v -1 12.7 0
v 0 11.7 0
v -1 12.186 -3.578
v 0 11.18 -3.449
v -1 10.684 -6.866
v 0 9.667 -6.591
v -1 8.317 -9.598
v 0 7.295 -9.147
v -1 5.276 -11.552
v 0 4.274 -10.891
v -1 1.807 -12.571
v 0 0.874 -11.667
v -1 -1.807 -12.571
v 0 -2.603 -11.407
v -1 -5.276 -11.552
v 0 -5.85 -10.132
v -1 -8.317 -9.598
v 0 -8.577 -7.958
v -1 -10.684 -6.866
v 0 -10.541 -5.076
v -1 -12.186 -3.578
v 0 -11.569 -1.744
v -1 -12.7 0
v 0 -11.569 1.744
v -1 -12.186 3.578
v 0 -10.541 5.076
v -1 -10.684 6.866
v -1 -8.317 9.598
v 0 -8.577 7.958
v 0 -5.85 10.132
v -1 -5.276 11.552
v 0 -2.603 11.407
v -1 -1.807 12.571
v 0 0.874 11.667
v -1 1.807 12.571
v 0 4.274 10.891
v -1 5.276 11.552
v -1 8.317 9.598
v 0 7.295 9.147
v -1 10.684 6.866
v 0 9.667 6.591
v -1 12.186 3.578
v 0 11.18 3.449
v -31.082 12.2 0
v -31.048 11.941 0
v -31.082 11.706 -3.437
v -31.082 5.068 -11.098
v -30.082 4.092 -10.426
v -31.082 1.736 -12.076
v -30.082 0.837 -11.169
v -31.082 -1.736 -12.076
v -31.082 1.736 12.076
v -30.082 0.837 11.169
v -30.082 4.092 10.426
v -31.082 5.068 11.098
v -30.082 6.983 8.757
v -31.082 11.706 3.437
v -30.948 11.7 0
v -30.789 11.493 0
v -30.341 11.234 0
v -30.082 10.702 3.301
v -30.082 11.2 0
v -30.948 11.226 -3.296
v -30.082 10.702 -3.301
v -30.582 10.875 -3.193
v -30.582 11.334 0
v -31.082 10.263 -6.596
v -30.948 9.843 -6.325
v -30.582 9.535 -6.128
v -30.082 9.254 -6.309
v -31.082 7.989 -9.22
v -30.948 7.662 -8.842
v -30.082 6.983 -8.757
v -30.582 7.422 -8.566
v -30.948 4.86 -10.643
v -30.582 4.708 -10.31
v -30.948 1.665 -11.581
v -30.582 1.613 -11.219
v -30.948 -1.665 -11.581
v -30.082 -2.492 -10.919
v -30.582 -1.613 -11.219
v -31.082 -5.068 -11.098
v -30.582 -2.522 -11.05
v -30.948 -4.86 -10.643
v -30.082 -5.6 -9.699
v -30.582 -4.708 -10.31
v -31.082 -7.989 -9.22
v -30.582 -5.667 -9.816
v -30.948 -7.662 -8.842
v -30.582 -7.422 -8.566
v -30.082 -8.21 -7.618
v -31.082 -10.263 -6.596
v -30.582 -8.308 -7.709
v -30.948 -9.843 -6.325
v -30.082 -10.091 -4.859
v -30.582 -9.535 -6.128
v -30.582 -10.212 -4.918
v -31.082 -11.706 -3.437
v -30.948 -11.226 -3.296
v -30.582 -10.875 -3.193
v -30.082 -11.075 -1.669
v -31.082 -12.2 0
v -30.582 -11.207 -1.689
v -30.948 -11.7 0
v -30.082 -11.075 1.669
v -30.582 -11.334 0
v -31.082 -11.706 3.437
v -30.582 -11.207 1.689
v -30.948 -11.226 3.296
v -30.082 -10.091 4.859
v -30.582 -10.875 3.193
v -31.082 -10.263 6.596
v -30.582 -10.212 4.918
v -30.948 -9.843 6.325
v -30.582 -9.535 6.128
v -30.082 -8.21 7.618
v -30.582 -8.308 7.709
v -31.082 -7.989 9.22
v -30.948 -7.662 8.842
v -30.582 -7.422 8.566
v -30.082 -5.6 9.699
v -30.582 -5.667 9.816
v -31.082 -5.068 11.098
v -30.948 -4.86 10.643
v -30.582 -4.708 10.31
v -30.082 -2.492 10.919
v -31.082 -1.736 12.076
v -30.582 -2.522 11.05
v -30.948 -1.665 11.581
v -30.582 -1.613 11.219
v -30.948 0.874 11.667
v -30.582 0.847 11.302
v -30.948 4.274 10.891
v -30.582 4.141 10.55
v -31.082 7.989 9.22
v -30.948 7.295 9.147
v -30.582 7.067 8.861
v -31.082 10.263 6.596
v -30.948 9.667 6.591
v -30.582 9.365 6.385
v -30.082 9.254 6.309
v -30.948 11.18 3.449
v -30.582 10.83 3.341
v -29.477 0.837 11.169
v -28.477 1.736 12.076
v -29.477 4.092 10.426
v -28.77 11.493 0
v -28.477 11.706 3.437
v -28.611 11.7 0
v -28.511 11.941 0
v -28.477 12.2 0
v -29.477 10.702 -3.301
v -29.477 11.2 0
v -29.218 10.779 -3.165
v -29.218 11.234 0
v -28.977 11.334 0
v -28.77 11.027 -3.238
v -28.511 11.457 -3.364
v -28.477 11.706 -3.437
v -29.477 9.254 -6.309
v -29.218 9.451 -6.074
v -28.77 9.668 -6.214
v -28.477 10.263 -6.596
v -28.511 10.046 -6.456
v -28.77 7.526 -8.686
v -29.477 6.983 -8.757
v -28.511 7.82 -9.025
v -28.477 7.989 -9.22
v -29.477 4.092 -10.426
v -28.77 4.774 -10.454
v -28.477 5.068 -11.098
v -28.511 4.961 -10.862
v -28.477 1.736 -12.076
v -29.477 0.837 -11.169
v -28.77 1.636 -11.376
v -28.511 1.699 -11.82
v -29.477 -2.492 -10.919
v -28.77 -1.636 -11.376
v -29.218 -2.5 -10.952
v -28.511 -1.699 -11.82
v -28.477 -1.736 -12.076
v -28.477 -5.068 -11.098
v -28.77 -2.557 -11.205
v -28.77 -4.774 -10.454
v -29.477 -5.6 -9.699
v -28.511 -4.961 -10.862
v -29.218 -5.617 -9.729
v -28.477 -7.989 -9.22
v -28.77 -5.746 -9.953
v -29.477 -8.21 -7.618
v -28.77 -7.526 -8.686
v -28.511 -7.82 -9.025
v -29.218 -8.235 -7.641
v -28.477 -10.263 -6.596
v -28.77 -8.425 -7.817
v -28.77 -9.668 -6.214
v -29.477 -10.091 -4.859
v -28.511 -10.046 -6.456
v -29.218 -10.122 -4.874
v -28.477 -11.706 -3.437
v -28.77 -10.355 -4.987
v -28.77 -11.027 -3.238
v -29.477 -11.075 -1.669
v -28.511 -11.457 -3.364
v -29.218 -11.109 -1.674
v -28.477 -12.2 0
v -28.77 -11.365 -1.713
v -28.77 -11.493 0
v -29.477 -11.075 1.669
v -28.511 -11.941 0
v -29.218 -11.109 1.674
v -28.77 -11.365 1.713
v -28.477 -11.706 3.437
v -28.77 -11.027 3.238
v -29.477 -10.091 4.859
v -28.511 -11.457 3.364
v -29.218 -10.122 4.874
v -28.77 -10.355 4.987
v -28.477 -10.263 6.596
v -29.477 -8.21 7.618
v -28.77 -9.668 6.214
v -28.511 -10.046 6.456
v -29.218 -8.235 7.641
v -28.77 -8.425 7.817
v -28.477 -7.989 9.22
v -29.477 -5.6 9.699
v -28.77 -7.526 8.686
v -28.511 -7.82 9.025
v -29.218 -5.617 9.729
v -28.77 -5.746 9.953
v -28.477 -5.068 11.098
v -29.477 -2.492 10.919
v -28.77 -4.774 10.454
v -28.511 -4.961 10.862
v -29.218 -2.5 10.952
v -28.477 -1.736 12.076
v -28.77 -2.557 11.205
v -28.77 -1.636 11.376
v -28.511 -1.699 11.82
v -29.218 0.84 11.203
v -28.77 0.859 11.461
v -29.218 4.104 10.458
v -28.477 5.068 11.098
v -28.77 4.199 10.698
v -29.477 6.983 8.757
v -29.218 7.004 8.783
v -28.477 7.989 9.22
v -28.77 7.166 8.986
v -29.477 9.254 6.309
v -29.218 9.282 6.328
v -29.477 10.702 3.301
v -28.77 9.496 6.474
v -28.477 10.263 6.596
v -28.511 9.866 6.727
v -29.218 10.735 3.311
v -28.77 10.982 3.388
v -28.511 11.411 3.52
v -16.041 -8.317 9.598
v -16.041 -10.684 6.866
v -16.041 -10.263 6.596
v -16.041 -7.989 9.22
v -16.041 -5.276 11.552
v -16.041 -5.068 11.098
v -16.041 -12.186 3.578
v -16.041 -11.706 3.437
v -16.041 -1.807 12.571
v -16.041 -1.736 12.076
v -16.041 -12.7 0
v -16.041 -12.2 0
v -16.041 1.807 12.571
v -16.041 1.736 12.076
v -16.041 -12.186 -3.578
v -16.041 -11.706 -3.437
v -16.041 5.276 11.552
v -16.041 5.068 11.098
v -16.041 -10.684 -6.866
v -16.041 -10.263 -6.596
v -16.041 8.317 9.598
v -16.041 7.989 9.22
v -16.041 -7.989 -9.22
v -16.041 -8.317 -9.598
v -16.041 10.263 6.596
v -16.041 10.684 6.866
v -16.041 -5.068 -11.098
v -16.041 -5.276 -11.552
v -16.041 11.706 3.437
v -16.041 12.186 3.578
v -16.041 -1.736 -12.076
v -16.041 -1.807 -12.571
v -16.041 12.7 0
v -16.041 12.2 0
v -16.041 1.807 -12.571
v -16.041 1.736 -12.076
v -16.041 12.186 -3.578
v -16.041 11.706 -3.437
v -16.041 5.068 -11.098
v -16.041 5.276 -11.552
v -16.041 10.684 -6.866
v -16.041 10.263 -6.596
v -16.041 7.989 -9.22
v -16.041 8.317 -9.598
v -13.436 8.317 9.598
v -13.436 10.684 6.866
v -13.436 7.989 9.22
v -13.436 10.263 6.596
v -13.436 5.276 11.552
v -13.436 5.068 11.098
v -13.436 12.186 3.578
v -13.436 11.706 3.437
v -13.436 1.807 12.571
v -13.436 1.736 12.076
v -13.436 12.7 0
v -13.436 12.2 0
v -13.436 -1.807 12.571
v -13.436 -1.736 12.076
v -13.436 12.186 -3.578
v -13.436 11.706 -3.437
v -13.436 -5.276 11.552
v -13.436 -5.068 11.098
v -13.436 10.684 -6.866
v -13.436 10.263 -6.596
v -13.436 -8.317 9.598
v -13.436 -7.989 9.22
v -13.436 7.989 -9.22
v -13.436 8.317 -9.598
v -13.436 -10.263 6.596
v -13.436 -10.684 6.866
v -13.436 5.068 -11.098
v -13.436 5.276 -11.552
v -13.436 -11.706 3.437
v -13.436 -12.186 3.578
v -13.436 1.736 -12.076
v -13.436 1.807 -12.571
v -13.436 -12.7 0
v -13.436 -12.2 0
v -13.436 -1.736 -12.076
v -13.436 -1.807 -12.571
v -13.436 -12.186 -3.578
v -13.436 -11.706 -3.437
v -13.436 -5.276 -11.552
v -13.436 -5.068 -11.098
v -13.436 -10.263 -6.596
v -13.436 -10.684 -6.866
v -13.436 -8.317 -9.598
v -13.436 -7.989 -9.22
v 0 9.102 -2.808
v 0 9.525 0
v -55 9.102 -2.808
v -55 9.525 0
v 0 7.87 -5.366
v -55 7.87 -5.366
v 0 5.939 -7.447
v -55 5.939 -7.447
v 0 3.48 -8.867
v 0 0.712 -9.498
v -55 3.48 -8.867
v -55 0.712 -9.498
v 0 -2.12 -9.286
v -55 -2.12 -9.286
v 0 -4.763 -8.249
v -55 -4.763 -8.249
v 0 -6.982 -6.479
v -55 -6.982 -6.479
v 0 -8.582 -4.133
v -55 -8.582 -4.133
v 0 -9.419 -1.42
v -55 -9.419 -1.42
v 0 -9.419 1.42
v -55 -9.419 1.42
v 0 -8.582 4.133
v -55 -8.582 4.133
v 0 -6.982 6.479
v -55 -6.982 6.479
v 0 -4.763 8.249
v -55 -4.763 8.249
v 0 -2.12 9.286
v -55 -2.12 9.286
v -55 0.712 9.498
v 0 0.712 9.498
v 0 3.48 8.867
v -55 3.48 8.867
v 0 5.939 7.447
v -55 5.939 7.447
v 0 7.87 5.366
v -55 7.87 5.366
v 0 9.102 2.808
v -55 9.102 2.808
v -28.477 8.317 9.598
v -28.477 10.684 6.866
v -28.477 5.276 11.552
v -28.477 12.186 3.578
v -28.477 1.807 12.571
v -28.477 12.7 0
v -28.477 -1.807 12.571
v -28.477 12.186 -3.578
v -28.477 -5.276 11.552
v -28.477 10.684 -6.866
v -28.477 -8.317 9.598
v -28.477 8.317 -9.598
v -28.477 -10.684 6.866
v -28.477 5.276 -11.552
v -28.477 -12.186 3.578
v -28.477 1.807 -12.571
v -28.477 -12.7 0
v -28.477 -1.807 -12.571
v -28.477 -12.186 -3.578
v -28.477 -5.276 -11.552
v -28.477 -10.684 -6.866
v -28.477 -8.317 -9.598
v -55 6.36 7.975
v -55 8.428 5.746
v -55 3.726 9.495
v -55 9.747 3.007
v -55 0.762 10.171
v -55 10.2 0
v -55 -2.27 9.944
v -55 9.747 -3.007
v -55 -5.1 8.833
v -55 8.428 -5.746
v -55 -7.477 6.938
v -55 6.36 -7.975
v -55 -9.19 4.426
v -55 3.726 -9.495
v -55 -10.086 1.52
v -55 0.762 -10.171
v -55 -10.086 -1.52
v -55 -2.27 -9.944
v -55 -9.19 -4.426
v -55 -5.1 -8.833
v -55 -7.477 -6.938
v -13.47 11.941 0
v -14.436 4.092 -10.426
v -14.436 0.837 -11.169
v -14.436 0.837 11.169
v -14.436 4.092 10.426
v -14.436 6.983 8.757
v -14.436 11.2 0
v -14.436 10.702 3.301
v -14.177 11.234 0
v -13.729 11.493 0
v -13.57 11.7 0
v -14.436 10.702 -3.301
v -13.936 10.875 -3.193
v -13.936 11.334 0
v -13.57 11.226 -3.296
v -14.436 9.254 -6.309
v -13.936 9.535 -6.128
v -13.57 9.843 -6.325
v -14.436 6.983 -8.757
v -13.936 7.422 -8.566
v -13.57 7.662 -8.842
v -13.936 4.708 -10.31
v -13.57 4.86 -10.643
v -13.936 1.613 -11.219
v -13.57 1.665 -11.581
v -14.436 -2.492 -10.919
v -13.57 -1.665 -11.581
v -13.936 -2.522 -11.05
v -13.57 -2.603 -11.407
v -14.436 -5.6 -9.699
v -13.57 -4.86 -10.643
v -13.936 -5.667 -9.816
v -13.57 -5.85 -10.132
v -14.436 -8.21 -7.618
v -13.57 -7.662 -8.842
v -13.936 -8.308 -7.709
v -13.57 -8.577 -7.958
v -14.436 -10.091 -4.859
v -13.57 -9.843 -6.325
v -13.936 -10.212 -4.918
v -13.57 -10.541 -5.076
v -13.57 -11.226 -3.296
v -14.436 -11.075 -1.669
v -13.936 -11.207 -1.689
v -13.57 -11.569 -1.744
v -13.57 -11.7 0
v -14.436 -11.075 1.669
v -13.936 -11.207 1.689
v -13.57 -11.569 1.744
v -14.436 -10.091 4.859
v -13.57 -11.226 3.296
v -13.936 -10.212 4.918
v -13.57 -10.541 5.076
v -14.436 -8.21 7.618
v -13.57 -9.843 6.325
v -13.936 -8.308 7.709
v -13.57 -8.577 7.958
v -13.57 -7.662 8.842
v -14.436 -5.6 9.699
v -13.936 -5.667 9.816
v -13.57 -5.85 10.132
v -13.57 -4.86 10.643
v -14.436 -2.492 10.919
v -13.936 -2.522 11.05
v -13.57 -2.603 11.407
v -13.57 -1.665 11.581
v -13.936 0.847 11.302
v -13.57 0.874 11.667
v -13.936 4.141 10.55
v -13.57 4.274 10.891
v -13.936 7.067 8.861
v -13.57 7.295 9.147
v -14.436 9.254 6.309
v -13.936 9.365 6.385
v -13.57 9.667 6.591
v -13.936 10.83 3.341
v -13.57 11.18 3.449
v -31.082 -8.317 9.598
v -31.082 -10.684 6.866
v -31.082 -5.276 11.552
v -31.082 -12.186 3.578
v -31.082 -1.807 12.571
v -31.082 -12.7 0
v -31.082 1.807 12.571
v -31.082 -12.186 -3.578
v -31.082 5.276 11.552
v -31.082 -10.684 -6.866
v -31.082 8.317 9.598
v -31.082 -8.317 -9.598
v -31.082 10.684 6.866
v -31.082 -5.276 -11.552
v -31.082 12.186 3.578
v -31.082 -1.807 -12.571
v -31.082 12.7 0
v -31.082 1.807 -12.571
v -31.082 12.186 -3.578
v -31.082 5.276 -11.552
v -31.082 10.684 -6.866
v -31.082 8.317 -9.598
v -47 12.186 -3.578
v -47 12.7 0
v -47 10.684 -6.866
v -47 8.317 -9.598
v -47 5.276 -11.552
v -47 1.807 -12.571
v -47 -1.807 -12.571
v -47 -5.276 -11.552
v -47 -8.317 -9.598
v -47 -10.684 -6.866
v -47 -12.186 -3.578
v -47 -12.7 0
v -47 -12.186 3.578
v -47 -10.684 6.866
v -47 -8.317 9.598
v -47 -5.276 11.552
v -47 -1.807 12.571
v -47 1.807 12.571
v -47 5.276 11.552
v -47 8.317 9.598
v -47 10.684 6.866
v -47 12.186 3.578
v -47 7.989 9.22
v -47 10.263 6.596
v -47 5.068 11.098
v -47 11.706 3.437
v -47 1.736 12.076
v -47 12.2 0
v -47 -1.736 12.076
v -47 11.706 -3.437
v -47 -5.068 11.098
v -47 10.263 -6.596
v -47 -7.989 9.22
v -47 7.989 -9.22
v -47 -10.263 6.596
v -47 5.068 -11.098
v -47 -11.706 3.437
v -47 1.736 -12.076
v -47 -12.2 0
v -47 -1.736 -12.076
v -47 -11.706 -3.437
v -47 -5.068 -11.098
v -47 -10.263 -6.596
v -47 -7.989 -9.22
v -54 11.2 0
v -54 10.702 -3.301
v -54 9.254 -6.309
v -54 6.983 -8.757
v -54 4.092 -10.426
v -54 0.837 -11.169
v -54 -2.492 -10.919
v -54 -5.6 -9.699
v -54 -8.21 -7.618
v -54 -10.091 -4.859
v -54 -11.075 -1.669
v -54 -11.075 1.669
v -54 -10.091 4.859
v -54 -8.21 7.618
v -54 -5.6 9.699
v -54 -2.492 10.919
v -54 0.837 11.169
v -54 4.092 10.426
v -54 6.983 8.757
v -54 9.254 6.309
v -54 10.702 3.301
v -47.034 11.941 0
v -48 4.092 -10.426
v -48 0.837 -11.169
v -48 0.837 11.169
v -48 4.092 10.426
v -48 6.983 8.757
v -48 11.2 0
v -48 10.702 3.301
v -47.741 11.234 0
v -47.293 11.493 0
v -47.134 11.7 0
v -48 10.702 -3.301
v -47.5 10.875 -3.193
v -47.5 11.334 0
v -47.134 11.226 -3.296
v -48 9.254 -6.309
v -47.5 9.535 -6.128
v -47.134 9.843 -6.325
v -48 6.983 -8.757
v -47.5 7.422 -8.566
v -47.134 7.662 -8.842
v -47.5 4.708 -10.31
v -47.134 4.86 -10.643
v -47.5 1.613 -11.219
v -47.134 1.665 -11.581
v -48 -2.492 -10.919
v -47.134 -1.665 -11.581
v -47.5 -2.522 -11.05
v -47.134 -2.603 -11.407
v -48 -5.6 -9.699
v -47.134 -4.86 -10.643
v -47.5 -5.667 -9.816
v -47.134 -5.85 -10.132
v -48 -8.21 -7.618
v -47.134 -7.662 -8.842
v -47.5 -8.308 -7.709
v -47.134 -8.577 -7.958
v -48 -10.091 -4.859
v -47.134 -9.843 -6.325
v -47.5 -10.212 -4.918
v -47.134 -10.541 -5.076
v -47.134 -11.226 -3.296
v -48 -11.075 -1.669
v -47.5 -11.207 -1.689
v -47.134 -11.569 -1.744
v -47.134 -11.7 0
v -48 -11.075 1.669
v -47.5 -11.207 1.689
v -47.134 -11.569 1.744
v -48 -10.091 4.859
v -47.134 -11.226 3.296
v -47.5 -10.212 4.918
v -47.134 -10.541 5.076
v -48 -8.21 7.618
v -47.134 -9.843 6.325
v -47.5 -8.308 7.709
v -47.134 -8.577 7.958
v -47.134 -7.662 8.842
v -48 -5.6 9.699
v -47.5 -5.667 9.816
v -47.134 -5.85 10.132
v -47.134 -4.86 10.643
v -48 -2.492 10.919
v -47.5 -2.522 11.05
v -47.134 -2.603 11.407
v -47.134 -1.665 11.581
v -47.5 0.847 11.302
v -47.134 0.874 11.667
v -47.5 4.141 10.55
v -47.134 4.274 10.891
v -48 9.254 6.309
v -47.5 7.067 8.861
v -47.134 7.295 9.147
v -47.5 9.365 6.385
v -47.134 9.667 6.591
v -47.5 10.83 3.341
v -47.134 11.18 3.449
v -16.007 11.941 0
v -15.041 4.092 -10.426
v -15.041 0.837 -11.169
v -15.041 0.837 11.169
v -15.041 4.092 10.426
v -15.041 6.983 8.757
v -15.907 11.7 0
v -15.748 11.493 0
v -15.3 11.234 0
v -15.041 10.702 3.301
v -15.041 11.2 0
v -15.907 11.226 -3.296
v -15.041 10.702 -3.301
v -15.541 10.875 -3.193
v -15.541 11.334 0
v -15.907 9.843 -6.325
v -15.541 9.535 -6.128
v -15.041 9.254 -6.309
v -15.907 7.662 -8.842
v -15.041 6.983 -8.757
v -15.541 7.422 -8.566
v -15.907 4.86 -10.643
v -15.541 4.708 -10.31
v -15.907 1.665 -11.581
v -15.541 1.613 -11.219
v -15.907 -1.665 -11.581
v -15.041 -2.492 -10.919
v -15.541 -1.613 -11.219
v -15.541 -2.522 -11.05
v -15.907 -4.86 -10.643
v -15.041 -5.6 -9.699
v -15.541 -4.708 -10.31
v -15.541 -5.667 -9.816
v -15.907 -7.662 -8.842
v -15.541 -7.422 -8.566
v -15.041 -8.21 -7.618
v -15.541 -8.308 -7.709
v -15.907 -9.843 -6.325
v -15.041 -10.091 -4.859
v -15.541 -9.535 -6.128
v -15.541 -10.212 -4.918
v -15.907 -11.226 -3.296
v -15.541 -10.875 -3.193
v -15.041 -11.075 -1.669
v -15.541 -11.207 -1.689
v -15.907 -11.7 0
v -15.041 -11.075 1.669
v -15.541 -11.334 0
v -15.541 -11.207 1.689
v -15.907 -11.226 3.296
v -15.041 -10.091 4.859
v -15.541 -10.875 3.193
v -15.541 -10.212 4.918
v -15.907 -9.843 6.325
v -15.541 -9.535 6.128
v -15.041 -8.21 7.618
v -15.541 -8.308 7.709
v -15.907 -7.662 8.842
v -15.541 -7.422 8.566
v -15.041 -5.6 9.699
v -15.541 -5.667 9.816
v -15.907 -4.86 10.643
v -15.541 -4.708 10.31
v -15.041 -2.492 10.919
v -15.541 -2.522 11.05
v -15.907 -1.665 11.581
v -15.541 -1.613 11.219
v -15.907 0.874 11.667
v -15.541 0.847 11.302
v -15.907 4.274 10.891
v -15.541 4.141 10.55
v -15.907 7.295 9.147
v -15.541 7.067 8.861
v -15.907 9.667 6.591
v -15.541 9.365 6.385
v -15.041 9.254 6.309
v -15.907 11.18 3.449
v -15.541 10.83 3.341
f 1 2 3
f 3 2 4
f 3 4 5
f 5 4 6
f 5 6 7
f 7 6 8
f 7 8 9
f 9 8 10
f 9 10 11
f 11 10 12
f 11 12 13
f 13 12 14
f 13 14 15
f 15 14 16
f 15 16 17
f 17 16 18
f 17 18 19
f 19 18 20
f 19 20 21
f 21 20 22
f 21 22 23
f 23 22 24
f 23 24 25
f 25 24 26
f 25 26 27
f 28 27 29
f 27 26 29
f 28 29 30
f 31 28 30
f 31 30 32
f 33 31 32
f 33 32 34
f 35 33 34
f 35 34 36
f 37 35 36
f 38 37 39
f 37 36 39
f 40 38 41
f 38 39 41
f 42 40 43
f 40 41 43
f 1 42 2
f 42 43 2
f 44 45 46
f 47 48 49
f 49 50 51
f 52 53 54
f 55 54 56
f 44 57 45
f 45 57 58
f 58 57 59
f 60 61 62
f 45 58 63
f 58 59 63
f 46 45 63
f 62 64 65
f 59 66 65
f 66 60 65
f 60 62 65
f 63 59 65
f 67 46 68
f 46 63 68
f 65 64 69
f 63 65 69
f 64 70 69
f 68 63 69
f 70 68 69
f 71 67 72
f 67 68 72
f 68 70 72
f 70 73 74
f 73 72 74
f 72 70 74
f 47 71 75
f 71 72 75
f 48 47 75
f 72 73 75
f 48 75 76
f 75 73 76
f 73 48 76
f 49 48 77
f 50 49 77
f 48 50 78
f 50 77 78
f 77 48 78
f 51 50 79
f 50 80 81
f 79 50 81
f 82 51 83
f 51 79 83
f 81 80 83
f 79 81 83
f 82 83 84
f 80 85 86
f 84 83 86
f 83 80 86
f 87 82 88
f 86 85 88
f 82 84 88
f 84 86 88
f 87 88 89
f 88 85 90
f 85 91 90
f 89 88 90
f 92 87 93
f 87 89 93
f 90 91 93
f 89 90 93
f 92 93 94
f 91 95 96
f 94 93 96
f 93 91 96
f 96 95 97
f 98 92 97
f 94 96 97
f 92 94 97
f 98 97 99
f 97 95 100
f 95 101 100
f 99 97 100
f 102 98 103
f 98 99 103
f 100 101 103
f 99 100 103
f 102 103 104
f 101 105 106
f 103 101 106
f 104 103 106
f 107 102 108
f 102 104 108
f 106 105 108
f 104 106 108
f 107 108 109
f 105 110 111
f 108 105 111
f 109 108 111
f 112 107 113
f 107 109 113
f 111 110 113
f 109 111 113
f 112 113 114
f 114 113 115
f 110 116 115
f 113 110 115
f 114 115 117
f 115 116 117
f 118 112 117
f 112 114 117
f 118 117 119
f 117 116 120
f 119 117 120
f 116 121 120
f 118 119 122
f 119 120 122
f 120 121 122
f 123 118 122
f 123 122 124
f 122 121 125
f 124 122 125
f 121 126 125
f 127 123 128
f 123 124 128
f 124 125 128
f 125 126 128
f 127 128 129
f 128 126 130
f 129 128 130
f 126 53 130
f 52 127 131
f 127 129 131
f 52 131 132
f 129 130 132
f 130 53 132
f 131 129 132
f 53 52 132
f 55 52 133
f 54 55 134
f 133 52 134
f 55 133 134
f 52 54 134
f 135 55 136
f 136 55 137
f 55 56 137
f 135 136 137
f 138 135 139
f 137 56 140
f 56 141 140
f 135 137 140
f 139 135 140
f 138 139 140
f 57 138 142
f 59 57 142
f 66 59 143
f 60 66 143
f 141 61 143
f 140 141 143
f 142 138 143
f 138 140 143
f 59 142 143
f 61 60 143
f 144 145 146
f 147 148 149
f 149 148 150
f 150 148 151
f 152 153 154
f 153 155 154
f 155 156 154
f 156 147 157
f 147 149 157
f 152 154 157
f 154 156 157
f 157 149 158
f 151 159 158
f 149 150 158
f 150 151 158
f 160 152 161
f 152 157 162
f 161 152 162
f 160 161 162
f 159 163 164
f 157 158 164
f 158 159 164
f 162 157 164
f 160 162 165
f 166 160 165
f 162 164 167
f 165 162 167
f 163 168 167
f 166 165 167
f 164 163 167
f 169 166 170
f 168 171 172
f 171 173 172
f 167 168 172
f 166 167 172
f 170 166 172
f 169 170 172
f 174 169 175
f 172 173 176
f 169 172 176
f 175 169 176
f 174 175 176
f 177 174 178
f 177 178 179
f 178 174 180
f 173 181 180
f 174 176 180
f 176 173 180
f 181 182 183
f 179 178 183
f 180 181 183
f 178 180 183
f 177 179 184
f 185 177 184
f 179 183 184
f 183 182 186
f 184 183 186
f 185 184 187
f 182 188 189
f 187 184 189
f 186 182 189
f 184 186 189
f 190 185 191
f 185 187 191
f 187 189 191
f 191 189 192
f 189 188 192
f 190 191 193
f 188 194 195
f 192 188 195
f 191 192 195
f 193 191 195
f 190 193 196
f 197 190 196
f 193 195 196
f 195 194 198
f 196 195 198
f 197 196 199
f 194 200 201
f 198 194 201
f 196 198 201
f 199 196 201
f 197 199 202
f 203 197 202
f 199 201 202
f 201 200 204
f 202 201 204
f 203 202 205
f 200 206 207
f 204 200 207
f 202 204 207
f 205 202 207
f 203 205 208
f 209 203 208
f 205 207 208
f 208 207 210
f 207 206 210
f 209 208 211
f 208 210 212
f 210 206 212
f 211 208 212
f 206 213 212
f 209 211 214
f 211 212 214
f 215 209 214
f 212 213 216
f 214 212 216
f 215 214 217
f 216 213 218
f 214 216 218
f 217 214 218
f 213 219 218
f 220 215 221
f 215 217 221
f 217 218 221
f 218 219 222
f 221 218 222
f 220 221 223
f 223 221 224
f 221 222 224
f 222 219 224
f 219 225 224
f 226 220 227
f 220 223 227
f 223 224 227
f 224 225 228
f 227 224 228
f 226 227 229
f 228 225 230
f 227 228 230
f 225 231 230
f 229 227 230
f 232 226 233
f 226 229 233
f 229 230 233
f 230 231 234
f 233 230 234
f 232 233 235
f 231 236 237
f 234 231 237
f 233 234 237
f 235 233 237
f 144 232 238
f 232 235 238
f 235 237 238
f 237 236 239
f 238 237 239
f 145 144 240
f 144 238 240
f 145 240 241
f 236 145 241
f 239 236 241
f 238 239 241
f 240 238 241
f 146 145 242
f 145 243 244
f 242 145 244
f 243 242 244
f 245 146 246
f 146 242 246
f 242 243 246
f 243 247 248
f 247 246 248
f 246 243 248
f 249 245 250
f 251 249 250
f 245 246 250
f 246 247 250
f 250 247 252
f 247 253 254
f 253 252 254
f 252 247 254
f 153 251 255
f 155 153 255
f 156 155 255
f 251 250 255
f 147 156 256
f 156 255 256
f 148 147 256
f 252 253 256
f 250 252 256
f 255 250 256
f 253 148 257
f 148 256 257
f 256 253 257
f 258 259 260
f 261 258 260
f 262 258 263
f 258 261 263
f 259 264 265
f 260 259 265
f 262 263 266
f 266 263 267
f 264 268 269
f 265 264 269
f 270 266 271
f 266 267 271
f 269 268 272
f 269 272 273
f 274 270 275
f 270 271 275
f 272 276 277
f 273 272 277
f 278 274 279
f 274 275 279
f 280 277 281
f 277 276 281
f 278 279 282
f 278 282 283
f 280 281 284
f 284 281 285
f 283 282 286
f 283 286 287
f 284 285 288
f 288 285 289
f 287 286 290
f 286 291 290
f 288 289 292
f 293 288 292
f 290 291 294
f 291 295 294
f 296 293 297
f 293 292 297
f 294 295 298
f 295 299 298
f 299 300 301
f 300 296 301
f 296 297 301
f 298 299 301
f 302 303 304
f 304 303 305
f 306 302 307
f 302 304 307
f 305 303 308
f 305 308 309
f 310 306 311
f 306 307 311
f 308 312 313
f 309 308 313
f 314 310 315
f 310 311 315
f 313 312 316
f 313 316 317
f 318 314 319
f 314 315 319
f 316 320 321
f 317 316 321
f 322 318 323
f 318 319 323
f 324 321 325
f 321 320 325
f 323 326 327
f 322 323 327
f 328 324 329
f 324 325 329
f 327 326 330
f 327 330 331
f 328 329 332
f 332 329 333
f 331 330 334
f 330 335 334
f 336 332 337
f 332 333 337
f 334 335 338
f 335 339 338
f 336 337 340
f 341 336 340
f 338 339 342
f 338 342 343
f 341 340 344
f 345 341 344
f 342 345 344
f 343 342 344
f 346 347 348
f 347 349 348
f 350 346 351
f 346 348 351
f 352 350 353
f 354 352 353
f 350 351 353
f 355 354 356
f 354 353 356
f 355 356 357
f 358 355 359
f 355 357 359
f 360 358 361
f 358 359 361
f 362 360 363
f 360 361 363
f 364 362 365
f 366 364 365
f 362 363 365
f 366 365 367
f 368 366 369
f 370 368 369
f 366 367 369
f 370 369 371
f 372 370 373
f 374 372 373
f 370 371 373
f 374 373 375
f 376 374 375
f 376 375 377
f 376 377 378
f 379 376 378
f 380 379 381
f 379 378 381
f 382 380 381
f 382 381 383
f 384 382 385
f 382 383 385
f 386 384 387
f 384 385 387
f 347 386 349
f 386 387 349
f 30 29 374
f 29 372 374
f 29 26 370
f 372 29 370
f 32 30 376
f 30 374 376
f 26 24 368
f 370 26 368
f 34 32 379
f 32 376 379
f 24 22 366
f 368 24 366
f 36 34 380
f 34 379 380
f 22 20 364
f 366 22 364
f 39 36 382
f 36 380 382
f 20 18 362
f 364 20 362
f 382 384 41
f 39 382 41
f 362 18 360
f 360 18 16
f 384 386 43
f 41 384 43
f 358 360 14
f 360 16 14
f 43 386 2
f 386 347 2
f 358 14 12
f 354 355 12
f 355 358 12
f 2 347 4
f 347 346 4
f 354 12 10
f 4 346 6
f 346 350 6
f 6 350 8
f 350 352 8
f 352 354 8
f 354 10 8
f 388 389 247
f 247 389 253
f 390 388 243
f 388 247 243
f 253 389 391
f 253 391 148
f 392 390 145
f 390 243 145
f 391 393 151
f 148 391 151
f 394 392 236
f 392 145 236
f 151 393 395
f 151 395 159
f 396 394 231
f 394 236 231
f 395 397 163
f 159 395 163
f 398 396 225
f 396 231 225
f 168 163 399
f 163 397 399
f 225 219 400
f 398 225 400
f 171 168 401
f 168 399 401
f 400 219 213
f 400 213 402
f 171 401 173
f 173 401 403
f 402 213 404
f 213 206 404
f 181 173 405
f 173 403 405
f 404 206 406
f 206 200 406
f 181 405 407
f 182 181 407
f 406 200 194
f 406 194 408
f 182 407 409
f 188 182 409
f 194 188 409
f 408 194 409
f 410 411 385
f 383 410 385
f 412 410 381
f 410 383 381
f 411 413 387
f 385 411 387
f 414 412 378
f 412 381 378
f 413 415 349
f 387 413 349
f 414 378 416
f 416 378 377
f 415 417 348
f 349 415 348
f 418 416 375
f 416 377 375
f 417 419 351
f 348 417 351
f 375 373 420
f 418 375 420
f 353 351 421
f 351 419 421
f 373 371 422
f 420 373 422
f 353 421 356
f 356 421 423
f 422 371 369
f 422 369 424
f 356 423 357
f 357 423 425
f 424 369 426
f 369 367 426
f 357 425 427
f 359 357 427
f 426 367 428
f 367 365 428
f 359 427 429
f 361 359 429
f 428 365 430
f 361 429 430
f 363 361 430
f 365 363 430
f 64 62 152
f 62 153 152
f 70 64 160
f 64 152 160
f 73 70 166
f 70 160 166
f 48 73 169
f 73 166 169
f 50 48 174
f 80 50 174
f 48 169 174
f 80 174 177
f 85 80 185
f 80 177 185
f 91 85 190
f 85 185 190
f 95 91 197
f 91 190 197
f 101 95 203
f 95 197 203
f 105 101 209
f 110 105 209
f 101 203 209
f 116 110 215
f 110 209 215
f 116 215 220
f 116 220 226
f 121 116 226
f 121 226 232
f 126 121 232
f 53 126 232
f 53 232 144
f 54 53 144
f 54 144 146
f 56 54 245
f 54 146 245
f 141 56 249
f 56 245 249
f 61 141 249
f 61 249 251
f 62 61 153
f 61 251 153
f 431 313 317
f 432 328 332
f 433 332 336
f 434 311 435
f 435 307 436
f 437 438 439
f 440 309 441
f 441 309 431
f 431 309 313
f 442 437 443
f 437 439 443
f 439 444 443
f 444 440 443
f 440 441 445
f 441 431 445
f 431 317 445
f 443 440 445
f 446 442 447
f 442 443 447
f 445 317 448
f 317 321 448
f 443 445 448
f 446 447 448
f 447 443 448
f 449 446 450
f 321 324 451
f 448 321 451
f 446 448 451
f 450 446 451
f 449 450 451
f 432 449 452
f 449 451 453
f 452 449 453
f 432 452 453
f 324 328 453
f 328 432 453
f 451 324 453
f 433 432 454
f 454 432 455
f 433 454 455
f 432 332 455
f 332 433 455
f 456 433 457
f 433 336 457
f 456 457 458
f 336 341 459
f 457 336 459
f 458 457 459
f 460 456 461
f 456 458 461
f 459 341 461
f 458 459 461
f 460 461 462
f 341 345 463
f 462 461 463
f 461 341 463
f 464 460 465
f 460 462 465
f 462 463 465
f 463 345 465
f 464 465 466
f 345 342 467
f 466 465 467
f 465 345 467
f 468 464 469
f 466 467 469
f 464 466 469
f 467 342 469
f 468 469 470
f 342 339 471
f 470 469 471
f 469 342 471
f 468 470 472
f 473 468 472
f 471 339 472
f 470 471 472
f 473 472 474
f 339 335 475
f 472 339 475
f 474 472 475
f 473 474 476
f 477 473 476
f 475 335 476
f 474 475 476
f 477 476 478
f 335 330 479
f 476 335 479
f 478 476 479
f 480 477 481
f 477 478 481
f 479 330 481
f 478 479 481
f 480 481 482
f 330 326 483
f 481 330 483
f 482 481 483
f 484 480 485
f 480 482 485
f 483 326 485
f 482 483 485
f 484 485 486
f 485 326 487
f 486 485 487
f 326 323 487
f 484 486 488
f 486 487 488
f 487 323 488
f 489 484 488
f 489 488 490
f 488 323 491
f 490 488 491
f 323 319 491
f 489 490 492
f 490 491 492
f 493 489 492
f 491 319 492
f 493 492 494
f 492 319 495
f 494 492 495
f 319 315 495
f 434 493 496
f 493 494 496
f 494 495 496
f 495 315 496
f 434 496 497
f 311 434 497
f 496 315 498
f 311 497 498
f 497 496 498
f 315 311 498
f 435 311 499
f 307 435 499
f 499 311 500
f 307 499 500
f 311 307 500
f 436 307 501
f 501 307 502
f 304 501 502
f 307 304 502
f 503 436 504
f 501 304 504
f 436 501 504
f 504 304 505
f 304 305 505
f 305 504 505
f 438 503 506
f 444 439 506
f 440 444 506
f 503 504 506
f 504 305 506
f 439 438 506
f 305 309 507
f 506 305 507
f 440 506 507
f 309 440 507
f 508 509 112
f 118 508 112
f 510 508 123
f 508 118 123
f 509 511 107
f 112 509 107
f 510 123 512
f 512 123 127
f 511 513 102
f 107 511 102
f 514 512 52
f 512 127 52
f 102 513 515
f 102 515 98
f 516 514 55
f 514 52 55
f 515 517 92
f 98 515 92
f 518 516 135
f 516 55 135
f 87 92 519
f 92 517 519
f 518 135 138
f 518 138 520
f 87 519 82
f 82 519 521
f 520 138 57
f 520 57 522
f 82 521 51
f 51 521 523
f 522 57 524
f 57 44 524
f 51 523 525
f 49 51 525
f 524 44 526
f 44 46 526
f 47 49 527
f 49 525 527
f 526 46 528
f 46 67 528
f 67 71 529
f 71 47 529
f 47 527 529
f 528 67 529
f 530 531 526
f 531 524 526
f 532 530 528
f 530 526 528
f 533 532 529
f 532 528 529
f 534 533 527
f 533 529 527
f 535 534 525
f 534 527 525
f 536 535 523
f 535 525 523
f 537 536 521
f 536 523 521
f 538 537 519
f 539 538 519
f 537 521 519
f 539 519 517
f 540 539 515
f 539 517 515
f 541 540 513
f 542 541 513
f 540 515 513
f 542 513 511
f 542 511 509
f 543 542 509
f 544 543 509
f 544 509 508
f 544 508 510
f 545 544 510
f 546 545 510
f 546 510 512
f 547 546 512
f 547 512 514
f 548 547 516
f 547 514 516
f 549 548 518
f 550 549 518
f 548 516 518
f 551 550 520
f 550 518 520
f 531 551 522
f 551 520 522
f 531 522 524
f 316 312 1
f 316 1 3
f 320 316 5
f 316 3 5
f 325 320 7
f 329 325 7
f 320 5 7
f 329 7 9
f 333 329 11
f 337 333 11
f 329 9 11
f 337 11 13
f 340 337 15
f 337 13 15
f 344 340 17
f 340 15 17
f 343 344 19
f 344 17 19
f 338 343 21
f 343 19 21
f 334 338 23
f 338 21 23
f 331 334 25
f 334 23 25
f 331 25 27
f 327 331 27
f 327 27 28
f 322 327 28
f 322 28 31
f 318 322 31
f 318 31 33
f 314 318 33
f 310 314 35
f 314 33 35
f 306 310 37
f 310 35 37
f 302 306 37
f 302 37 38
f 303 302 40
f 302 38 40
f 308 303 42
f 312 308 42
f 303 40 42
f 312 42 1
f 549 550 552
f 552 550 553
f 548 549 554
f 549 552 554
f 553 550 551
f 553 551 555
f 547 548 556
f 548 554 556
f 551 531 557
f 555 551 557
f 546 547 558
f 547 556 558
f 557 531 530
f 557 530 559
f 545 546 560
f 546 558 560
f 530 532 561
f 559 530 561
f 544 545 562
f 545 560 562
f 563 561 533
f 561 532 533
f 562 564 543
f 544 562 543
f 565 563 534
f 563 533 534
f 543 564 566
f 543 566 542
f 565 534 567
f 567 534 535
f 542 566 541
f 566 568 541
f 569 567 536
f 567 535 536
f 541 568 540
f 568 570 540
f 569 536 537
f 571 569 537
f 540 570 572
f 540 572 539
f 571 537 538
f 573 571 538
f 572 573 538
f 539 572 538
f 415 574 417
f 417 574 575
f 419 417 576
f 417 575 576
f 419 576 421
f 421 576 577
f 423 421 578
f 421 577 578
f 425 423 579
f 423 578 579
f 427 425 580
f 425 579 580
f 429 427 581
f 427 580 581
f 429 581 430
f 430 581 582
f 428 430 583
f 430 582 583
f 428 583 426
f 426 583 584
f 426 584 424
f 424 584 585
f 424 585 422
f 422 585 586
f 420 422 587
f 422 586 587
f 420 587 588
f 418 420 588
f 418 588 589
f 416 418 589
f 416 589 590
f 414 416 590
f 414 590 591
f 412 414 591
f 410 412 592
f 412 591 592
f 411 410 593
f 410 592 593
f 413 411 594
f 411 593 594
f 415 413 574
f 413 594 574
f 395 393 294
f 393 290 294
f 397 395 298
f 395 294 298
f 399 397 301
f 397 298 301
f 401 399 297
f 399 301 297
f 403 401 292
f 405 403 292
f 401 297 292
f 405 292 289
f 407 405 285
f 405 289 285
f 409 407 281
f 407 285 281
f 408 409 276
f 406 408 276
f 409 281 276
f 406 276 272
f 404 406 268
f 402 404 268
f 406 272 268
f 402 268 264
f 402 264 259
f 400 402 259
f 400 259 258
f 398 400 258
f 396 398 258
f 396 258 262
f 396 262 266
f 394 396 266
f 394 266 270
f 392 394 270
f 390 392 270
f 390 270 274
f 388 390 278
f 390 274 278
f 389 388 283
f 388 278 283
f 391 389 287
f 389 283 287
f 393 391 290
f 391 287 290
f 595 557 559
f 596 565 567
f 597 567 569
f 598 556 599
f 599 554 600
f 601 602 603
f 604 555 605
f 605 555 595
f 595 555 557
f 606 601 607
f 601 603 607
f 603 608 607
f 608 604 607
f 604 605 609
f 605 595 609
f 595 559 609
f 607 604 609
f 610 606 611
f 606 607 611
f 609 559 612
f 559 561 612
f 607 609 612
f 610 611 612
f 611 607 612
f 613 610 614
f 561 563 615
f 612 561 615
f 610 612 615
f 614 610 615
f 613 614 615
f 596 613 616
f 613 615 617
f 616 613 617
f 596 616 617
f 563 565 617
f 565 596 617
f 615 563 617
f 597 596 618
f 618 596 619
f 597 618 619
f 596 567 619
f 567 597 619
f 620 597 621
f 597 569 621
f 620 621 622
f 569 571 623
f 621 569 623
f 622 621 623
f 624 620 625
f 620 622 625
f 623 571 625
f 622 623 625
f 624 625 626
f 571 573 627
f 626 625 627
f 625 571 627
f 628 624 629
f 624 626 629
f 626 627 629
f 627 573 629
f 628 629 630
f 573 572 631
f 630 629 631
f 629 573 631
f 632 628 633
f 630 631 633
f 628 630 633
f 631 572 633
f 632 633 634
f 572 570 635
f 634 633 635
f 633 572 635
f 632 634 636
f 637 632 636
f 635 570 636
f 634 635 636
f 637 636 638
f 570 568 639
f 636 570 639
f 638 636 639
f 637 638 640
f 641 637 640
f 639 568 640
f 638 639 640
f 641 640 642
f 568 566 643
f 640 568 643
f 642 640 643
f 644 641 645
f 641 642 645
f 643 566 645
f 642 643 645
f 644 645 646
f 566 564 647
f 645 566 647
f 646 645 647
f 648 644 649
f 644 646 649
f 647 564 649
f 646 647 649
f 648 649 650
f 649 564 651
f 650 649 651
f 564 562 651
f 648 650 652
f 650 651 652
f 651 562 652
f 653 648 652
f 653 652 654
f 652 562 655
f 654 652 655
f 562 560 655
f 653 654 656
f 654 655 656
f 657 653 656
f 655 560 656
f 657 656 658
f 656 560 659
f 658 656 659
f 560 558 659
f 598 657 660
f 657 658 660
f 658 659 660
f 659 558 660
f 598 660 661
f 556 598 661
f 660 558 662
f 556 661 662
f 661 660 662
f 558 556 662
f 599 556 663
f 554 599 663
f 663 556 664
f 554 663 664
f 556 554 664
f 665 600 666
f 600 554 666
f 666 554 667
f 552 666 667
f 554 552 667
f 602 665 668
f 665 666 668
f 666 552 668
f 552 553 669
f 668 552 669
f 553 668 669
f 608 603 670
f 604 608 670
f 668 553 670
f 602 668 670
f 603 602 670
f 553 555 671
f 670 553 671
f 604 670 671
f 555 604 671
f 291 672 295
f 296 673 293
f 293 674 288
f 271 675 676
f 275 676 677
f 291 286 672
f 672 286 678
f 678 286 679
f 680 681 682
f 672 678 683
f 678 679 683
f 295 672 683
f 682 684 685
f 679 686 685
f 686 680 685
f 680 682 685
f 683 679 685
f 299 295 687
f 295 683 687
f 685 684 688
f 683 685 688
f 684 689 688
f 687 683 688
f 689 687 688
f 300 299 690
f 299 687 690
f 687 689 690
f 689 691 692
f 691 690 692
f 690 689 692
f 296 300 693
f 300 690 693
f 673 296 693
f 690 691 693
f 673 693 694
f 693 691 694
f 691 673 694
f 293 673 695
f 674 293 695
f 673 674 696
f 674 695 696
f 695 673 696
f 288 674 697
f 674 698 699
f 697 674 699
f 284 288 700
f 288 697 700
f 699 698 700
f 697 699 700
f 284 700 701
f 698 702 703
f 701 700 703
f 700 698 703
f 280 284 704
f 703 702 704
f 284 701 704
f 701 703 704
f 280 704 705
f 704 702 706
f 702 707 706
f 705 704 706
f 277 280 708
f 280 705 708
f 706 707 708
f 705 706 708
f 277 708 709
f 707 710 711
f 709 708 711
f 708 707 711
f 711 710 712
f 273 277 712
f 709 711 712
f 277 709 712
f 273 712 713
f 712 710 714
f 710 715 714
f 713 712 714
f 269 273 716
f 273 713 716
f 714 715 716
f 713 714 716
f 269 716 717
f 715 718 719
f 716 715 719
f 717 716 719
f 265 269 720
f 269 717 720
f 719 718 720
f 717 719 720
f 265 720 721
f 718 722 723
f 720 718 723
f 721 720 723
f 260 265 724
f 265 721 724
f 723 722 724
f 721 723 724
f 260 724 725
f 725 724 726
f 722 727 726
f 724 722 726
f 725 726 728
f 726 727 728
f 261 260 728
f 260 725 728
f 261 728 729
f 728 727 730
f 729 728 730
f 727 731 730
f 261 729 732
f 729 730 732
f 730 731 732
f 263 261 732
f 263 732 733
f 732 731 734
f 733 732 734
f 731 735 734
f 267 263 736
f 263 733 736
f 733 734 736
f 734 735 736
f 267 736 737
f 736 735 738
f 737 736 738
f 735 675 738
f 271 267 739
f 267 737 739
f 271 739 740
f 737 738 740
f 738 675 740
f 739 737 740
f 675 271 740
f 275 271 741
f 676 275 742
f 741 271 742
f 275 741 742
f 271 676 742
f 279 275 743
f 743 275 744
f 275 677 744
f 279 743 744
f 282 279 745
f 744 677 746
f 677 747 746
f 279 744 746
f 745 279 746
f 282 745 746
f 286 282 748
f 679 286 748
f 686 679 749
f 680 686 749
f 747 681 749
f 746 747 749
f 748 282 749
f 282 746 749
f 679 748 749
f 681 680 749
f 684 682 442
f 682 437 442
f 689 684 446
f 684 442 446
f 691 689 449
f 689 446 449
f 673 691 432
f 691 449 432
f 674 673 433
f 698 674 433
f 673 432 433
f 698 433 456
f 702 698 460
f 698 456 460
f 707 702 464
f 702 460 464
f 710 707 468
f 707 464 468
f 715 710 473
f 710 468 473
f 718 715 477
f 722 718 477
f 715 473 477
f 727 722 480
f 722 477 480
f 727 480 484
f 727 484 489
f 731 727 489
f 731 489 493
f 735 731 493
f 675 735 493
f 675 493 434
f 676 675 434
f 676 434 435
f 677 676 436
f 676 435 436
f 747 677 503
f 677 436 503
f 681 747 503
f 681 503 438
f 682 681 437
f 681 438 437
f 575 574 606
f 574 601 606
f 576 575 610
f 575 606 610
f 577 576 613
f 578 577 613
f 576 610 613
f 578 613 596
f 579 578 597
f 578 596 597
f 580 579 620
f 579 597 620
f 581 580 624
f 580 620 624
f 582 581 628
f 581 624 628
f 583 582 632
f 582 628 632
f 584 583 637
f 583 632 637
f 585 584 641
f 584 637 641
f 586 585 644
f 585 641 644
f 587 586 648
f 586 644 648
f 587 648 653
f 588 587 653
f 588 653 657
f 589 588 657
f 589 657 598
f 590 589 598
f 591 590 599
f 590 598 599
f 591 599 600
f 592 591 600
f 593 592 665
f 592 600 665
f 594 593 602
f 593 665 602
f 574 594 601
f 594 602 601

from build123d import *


with BuildPart() as part:
    # Sketch1 → Revolve1 (revolve)
    with BuildSketch(Plane.XY):
        with BuildLine():
            Line((0, 9.525), (-55, 9.525))
            Line((-55, 9.525), (-55, 10.2))
            Line((-55, 10.2), (-54, 11.2))
            Line((-54, 11.2), (-48, 11.2))
            ThreePointArc((-48, 11.2), (-47.292893219, 11.492893219), (-47, 12.2))
            Line((-47, 12.2), (-47, 12.7))
            Line((-47, 12.7), (-31.08207122, 12.7))
            Line((-31.08207122, 12.7), (-31.08207122, 12.2))
            ThreePointArc((-31.08207122, 12.2), (-30.789178001, 11.492893219), (-30.08207122, 11.2))
            Line((-30.08207122, 11.2), (-29.477097815, 11.2))
            ThreePointArc((-29.477097815, 11.2), (-28.769991033, 11.492893219), (-28.477097815, 12.2))
            Line((-28.477097815, 12.2), (-28.477097815, 12.7))
            Line((-28.477097815, 12.7), (-16.04103561, 12.7))
            Line((-16.04103561, 12.7), (-16.04103561, 12.2))
            ThreePointArc((-16.04103561, 12.2), (-15.748142391, 11.492893219), (-15.04103561, 11.2))
            Line((-15.04103561, 11.2), (-14.436062205, 11.2))
            ThreePointArc((-14.436062205, 11.2), (-13.728955423, 11.492893219), (-13.436062205, 12.2))
            Line((-13.436062205, 12.2), (-13.436062205, 12.7))
            Line((-13.436062205, 12.7), (-1, 12.7))
            Line((-1, 12.7), (0, 11.7))
            Line((0, 11.7), (0, 9.525))
        make_face()
    revolve(axis=Axis((19.168296655, 0, 0), (-1, 0, 0)))


solid = part.part
